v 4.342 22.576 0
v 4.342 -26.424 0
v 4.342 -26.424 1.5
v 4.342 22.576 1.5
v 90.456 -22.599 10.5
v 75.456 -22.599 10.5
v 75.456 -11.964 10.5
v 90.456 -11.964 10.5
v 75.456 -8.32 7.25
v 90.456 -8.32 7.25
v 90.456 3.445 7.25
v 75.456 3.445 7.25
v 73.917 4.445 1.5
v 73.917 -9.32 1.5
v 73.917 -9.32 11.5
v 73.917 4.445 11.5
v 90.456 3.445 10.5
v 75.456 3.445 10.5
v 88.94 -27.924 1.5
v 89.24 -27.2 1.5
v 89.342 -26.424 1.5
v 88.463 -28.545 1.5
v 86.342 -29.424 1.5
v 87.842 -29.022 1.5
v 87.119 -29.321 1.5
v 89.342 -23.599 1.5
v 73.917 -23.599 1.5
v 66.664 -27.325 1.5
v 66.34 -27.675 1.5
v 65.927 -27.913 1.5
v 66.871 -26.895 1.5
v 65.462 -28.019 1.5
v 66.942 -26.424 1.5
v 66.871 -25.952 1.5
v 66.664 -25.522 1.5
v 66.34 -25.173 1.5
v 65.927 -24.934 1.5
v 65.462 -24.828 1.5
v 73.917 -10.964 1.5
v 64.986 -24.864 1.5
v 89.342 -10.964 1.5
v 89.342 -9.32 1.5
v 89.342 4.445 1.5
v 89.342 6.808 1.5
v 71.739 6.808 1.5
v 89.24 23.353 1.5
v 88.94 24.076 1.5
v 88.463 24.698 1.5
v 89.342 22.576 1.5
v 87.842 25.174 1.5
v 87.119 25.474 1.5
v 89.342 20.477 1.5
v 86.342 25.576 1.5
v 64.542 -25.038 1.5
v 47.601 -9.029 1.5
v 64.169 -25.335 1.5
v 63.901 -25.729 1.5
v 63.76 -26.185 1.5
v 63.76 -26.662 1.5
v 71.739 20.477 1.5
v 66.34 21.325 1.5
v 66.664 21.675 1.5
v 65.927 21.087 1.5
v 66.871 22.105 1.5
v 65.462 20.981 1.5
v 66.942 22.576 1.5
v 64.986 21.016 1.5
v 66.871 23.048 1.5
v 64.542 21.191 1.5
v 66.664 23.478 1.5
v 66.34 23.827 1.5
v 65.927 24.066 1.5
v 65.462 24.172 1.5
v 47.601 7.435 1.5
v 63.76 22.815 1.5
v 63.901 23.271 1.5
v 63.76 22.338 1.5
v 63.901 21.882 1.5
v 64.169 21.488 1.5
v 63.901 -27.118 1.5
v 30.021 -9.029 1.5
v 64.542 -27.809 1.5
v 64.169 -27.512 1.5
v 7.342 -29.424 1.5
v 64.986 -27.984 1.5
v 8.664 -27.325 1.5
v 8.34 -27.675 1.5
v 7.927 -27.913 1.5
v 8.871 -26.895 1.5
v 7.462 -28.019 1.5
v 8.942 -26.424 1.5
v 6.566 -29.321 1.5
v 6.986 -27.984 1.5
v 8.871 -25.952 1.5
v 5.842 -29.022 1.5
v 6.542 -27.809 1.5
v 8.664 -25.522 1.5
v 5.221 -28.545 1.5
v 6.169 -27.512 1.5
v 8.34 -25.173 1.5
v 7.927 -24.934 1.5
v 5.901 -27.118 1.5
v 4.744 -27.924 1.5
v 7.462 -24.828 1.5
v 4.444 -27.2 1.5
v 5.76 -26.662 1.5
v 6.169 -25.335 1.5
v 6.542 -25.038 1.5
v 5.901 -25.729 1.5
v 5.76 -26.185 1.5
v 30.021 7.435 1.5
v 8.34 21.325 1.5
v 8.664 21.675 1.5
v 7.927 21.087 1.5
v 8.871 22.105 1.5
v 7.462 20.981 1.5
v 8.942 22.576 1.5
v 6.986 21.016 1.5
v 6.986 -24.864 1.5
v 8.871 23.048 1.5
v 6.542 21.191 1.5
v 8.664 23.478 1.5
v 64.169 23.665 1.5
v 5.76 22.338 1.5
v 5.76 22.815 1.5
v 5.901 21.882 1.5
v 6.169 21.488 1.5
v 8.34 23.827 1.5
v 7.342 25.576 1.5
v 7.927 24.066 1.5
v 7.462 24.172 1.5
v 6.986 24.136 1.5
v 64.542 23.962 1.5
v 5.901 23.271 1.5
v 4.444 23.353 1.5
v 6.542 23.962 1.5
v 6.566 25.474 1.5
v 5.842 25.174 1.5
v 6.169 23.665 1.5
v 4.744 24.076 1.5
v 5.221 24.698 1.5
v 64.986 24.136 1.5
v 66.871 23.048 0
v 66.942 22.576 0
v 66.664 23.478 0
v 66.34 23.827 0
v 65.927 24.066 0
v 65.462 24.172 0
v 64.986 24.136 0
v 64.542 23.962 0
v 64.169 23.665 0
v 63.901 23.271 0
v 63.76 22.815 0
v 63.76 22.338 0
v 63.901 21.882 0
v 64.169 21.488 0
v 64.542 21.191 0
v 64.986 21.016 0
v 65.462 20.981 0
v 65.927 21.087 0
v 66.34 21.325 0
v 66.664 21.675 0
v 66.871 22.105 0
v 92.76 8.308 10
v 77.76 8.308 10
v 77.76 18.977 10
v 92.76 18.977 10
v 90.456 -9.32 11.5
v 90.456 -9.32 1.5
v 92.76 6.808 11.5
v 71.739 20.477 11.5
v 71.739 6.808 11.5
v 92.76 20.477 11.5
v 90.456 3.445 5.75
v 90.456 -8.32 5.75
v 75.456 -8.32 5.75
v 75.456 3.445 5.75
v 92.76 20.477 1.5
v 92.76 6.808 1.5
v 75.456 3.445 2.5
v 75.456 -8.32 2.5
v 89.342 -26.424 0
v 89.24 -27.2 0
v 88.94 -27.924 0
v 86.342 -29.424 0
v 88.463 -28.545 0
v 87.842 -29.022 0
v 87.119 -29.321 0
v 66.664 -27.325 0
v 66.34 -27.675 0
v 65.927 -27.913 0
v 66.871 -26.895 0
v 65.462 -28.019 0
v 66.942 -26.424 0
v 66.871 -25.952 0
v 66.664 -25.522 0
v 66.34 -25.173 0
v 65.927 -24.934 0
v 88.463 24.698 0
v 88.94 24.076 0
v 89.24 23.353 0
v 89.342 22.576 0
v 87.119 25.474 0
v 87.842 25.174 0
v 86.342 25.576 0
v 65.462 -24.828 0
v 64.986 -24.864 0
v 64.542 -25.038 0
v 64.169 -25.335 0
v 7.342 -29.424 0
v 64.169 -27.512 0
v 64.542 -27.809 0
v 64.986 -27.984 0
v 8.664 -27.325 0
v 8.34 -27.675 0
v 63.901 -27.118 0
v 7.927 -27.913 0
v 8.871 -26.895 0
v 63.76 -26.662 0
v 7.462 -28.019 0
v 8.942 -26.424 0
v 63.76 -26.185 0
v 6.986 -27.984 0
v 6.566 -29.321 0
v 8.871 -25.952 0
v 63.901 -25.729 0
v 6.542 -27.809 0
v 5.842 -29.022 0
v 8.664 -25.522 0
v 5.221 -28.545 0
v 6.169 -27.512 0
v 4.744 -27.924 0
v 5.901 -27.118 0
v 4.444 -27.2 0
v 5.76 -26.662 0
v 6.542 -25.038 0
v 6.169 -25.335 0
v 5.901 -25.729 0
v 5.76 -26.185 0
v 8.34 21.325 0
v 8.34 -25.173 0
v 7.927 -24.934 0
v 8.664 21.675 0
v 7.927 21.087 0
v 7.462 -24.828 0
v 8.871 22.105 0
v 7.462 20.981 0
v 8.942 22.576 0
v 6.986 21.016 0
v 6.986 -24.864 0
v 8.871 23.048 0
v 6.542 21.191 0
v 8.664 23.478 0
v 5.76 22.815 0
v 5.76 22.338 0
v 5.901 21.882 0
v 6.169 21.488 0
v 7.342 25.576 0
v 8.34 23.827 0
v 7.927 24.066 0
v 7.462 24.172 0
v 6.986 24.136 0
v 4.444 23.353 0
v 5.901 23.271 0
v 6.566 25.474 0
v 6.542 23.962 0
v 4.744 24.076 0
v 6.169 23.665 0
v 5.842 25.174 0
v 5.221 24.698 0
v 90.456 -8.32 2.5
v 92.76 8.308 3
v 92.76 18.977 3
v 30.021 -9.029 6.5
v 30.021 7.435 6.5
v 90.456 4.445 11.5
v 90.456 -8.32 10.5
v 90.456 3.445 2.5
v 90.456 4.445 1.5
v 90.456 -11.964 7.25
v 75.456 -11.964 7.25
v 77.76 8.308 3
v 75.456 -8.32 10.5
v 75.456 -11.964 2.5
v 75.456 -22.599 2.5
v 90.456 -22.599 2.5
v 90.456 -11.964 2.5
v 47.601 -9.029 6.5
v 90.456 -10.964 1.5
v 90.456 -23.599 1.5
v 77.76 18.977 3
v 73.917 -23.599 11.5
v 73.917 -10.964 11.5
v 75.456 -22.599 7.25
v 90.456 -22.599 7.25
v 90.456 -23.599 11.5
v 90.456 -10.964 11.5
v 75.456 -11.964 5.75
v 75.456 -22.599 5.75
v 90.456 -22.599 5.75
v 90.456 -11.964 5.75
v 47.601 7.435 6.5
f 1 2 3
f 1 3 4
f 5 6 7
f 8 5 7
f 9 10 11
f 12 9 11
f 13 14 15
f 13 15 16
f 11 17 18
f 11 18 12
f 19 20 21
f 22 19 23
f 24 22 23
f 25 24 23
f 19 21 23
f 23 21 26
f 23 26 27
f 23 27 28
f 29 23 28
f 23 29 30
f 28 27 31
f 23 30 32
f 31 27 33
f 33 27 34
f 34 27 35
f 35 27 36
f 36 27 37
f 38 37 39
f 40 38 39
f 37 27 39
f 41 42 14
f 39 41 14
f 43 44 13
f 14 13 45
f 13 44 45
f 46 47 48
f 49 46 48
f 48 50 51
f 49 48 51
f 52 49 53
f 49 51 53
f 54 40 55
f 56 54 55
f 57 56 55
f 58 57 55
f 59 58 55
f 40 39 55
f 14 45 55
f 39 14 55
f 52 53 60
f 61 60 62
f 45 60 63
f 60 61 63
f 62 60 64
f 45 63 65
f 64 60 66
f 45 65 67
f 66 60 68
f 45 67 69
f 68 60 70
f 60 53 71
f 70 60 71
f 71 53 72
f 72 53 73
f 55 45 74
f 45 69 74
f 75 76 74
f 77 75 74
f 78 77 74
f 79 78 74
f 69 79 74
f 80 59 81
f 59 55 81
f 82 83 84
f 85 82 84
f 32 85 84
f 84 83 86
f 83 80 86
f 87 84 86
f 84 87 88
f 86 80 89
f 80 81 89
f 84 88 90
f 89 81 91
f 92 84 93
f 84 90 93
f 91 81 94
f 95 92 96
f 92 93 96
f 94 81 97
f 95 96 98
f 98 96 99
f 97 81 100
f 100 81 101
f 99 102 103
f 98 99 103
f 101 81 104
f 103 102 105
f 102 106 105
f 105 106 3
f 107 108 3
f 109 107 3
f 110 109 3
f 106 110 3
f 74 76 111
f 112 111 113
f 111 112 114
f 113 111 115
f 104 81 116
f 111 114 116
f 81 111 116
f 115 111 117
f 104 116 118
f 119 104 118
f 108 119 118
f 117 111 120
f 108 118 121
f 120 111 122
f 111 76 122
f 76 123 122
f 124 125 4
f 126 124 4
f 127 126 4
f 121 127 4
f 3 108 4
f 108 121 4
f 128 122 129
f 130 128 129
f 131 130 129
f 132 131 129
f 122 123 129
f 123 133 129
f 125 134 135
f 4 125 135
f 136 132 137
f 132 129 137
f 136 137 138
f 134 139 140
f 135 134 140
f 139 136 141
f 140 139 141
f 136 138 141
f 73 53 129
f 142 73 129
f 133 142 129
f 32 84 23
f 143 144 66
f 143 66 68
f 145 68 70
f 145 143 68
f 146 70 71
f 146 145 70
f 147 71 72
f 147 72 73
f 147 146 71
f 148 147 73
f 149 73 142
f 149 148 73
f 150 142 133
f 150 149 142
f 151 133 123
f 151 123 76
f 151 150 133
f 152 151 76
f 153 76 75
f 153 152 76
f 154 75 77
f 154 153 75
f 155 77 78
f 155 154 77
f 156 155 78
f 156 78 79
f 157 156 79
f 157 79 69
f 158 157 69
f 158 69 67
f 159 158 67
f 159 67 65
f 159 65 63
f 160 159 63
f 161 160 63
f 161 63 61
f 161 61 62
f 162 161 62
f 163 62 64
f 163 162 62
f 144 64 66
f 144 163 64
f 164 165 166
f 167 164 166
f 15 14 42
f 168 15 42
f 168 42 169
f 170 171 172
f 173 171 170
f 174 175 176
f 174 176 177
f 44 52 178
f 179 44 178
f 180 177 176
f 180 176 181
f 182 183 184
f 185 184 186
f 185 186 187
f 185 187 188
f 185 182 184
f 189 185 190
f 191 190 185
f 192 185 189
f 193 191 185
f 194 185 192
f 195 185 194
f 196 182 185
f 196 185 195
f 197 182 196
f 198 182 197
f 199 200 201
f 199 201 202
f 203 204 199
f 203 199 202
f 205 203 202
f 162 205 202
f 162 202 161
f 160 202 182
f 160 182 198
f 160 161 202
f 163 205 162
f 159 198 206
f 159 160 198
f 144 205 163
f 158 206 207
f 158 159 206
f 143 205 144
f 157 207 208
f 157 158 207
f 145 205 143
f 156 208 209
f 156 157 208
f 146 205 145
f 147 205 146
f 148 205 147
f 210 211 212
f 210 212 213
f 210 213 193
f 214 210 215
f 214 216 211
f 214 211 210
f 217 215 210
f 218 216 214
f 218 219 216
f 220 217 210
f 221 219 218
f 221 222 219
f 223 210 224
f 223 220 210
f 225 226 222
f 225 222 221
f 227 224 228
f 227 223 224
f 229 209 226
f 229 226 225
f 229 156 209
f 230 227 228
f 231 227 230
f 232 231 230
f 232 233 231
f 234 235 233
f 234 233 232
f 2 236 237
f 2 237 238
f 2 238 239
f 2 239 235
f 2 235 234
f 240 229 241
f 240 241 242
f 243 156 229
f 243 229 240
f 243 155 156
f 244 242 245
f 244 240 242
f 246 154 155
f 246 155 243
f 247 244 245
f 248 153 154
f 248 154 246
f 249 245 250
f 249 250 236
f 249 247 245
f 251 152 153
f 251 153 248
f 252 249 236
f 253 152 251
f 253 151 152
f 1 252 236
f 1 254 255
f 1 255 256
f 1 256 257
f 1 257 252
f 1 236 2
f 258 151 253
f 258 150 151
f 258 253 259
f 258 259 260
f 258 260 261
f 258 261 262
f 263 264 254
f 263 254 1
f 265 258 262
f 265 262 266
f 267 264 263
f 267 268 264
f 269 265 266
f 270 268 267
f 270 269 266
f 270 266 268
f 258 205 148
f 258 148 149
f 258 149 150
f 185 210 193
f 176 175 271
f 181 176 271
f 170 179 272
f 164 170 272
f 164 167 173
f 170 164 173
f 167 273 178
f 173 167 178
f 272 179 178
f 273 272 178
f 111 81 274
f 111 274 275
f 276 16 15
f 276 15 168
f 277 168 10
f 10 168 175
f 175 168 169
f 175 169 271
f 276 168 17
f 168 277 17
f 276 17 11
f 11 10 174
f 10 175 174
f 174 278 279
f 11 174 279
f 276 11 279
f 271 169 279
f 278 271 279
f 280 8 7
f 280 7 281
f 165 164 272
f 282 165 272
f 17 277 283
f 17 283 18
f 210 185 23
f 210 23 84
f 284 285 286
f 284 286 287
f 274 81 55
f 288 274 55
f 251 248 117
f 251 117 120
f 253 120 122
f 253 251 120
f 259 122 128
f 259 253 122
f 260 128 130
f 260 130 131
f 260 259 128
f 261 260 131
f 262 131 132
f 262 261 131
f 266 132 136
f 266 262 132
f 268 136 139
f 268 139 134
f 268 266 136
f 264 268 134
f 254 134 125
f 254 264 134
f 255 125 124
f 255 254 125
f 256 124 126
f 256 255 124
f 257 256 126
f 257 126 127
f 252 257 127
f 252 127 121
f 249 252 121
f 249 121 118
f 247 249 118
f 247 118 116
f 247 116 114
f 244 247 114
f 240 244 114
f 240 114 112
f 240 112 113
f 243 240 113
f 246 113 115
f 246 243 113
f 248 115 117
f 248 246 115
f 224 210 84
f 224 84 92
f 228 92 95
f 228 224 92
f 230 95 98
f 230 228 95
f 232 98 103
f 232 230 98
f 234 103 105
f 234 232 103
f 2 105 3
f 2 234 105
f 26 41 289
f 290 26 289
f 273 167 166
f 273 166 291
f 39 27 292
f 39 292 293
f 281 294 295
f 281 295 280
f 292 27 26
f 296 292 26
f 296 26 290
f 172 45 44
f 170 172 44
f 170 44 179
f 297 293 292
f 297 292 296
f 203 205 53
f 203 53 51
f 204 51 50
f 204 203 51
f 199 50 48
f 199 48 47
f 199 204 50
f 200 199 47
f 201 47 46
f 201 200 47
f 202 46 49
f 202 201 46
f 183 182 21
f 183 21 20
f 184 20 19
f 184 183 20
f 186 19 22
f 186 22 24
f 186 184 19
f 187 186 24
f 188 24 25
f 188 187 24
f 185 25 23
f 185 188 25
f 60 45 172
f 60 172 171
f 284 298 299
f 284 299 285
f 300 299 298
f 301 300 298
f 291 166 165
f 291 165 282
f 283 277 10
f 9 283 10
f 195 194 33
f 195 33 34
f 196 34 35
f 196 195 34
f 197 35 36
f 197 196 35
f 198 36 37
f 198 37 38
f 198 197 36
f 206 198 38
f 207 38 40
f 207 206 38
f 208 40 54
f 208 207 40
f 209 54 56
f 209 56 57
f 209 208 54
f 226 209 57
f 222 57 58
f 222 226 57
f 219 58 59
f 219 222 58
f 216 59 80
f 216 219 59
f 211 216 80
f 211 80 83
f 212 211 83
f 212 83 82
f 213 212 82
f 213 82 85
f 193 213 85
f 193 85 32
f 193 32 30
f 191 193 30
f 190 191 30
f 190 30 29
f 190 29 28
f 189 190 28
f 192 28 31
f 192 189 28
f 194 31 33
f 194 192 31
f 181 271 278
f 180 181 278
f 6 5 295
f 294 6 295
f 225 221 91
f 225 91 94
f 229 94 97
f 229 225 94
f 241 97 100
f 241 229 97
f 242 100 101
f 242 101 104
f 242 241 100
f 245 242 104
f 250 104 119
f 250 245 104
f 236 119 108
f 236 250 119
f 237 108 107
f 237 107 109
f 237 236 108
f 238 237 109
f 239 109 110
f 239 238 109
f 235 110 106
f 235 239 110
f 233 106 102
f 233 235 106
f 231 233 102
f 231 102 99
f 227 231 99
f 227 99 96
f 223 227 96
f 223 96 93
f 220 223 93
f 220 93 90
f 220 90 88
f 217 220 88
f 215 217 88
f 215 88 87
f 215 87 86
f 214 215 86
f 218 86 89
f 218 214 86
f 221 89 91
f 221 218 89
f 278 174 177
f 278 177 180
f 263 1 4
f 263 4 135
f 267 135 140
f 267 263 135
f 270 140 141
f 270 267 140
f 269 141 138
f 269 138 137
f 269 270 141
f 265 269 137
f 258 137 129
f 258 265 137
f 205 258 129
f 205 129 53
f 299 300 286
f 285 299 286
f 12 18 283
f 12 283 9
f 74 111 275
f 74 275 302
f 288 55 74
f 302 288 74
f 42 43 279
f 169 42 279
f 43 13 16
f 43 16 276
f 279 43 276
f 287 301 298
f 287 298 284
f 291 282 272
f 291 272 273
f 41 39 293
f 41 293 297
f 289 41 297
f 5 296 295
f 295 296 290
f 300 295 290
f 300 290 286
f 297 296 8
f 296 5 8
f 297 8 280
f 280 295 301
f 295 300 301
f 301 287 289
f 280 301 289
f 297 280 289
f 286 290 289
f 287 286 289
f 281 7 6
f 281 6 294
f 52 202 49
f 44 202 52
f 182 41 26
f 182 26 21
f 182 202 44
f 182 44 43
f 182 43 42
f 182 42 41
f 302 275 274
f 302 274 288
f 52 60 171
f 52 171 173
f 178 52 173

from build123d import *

# Parameters (mm, degrees)
SKETCH1_R           = 1.6
BOSS_EXTRUDE1_DEPTH = 1.5
SKETCH2_W           = 21.020817279
SKETCH2_H           = 13.668708773
SKETCH2_W_2         = 16.538575955
SKETCH2_H_2         = 13.76502595
SKETCH2_H_3         = 12.635061133
BOSS_EXTRUDE2_DEPTH = 10
SKETCH3_W           = 17.580136513
SKETCH3_H           = 16.463937369
BOSS_EXTRUDE3_DEPTH = 5
SKETCH4_W           = 7
SKETCH4_H           = 10.668708773
CUT_EXTRUDE1_DEPTH  = 15
SKETCH5_W           = 3.25
SKETCH5_H           = 10.635061133
SKETCH5_H_2         = 11.76502595
CUT_EXTRUDE2_DEPTH  = 15


with BuildPart() as part:
    # Sketch1 → Boss-Extrude1 (new body)
    with BuildSketch(Plane.XY):
        with BuildLine():
            Line((7.342063859, 25.576361327), (86.342063859, 25.576361327))
            ThreePointArc((86.342063859, 25.576361327), (88.463384202, 24.697681671), (89.342063859, 22.576361327))
            Line((89.342063859, 22.576361327), (89.342063859, -26.423638673))
            ThreePointArc((89.342063859, -26.423638673), (88.463384202, -28.544959016), (86.342063859, -29.423638673))
            Line((86.342063859, -29.423638673), (7.342063859, -29.423638673))
            ThreePointArc((7.342063859, -29.423638673), (5.220743515, -28.544959016), (4.342063859, -26.423638673))
            Line((4.342063859, -26.423638673), (4.342063859, 22.576361327))
            ThreePointArc((4.342063859, 22.576361327), (5.220743515, 24.697681671), (7.342063859, 25.576361327))
        make_face()
        with Locations((7.342063859, 22.576361327)):
            Circle(SKETCH1_R, mode=Mode.SUBTRACT)
        with Locations((7.342063859, -26.423638673)):
            Circle(SKETCH1_R, mode=Mode.SUBTRACT)
        with Locations((65.342063859, -26.423638673)):
            Circle(SKETCH1_R, mode=Mode.SUBTRACT)
        with Locations((65.342063859, 22.576361327)):
            Circle(SKETCH1_R, mode=Mode.SUBTRACT)
    extrude(amount=BOSS_EXTRUDE1_DEPTH)

    # Sketch2 → Boss-Extrude2 (add)
    with BuildSketch(Plane.XY.offset(1.5)):
        with Locations((82.249107191, 13.642831506)):
            Rectangle(SKETCH2_W, SKETCH2_H)
        with Locations((82.18632648, -2.437513953)):
            Rectangle(SKETCH2_W_2, SKETCH2_H_2)
        with Locations((82.18632648, -17.281142683)):
            Rectangle(SKETCH2_W_2, SKETCH2_H_3)
    extrude(amount=BOSS_EXTRUDE2_DEPTH)

    # Sketch3 → Boss-Extrude3 (add)
    with BuildSketch(Plane.XY.offset(1.5)):
        with Locations((38.810601532, -0.796926727)):
            Rectangle(SKETCH3_W, SKETCH3_H)
    extrude(amount=BOSS_EXTRUDE3_DEPTH)

    # Sketch4 → Cut-Extrude1 (cut)
    with BuildSketch(Plane(origin=(92.75951583, 0, 0), x_dir=(0, 0, -1), z_dir=(1, 0, 0))):
        with Locations((-6.5, 13.642831506)):
            Rectangle(SKETCH4_W, SKETCH4_H)
    extrude(amount=-CUT_EXTRUDE1_DEPTH, mode=Mode.SUBTRACT)

    # Sketch5 → Cut-Extrude2 (cut)
    with BuildSketch(Plane(origin=(90.455614457, 0, 0), x_dir=(0, 0, -1), z_dir=(1, 0, 0))):
        with Locations((-4.125, -17.281142683)):
            Rectangle(SKETCH5_W, SKETCH5_H)
        with Locations((-8.875, -17.281142683)):
            Rectangle(SKETCH5_W, SKETCH5_H)
        with Locations((-4.125, -2.437513953)):
            Rectangle(SKETCH5_W, SKETCH5_H_2)
        with Locations((-8.875, -2.437513953)):
            Rectangle(SKETCH5_W, SKETCH5_H_2)
    extrude(amount=-CUT_EXTRUDE2_DEPTH, mode=Mode.SUBTRACT)


solid = part.part
